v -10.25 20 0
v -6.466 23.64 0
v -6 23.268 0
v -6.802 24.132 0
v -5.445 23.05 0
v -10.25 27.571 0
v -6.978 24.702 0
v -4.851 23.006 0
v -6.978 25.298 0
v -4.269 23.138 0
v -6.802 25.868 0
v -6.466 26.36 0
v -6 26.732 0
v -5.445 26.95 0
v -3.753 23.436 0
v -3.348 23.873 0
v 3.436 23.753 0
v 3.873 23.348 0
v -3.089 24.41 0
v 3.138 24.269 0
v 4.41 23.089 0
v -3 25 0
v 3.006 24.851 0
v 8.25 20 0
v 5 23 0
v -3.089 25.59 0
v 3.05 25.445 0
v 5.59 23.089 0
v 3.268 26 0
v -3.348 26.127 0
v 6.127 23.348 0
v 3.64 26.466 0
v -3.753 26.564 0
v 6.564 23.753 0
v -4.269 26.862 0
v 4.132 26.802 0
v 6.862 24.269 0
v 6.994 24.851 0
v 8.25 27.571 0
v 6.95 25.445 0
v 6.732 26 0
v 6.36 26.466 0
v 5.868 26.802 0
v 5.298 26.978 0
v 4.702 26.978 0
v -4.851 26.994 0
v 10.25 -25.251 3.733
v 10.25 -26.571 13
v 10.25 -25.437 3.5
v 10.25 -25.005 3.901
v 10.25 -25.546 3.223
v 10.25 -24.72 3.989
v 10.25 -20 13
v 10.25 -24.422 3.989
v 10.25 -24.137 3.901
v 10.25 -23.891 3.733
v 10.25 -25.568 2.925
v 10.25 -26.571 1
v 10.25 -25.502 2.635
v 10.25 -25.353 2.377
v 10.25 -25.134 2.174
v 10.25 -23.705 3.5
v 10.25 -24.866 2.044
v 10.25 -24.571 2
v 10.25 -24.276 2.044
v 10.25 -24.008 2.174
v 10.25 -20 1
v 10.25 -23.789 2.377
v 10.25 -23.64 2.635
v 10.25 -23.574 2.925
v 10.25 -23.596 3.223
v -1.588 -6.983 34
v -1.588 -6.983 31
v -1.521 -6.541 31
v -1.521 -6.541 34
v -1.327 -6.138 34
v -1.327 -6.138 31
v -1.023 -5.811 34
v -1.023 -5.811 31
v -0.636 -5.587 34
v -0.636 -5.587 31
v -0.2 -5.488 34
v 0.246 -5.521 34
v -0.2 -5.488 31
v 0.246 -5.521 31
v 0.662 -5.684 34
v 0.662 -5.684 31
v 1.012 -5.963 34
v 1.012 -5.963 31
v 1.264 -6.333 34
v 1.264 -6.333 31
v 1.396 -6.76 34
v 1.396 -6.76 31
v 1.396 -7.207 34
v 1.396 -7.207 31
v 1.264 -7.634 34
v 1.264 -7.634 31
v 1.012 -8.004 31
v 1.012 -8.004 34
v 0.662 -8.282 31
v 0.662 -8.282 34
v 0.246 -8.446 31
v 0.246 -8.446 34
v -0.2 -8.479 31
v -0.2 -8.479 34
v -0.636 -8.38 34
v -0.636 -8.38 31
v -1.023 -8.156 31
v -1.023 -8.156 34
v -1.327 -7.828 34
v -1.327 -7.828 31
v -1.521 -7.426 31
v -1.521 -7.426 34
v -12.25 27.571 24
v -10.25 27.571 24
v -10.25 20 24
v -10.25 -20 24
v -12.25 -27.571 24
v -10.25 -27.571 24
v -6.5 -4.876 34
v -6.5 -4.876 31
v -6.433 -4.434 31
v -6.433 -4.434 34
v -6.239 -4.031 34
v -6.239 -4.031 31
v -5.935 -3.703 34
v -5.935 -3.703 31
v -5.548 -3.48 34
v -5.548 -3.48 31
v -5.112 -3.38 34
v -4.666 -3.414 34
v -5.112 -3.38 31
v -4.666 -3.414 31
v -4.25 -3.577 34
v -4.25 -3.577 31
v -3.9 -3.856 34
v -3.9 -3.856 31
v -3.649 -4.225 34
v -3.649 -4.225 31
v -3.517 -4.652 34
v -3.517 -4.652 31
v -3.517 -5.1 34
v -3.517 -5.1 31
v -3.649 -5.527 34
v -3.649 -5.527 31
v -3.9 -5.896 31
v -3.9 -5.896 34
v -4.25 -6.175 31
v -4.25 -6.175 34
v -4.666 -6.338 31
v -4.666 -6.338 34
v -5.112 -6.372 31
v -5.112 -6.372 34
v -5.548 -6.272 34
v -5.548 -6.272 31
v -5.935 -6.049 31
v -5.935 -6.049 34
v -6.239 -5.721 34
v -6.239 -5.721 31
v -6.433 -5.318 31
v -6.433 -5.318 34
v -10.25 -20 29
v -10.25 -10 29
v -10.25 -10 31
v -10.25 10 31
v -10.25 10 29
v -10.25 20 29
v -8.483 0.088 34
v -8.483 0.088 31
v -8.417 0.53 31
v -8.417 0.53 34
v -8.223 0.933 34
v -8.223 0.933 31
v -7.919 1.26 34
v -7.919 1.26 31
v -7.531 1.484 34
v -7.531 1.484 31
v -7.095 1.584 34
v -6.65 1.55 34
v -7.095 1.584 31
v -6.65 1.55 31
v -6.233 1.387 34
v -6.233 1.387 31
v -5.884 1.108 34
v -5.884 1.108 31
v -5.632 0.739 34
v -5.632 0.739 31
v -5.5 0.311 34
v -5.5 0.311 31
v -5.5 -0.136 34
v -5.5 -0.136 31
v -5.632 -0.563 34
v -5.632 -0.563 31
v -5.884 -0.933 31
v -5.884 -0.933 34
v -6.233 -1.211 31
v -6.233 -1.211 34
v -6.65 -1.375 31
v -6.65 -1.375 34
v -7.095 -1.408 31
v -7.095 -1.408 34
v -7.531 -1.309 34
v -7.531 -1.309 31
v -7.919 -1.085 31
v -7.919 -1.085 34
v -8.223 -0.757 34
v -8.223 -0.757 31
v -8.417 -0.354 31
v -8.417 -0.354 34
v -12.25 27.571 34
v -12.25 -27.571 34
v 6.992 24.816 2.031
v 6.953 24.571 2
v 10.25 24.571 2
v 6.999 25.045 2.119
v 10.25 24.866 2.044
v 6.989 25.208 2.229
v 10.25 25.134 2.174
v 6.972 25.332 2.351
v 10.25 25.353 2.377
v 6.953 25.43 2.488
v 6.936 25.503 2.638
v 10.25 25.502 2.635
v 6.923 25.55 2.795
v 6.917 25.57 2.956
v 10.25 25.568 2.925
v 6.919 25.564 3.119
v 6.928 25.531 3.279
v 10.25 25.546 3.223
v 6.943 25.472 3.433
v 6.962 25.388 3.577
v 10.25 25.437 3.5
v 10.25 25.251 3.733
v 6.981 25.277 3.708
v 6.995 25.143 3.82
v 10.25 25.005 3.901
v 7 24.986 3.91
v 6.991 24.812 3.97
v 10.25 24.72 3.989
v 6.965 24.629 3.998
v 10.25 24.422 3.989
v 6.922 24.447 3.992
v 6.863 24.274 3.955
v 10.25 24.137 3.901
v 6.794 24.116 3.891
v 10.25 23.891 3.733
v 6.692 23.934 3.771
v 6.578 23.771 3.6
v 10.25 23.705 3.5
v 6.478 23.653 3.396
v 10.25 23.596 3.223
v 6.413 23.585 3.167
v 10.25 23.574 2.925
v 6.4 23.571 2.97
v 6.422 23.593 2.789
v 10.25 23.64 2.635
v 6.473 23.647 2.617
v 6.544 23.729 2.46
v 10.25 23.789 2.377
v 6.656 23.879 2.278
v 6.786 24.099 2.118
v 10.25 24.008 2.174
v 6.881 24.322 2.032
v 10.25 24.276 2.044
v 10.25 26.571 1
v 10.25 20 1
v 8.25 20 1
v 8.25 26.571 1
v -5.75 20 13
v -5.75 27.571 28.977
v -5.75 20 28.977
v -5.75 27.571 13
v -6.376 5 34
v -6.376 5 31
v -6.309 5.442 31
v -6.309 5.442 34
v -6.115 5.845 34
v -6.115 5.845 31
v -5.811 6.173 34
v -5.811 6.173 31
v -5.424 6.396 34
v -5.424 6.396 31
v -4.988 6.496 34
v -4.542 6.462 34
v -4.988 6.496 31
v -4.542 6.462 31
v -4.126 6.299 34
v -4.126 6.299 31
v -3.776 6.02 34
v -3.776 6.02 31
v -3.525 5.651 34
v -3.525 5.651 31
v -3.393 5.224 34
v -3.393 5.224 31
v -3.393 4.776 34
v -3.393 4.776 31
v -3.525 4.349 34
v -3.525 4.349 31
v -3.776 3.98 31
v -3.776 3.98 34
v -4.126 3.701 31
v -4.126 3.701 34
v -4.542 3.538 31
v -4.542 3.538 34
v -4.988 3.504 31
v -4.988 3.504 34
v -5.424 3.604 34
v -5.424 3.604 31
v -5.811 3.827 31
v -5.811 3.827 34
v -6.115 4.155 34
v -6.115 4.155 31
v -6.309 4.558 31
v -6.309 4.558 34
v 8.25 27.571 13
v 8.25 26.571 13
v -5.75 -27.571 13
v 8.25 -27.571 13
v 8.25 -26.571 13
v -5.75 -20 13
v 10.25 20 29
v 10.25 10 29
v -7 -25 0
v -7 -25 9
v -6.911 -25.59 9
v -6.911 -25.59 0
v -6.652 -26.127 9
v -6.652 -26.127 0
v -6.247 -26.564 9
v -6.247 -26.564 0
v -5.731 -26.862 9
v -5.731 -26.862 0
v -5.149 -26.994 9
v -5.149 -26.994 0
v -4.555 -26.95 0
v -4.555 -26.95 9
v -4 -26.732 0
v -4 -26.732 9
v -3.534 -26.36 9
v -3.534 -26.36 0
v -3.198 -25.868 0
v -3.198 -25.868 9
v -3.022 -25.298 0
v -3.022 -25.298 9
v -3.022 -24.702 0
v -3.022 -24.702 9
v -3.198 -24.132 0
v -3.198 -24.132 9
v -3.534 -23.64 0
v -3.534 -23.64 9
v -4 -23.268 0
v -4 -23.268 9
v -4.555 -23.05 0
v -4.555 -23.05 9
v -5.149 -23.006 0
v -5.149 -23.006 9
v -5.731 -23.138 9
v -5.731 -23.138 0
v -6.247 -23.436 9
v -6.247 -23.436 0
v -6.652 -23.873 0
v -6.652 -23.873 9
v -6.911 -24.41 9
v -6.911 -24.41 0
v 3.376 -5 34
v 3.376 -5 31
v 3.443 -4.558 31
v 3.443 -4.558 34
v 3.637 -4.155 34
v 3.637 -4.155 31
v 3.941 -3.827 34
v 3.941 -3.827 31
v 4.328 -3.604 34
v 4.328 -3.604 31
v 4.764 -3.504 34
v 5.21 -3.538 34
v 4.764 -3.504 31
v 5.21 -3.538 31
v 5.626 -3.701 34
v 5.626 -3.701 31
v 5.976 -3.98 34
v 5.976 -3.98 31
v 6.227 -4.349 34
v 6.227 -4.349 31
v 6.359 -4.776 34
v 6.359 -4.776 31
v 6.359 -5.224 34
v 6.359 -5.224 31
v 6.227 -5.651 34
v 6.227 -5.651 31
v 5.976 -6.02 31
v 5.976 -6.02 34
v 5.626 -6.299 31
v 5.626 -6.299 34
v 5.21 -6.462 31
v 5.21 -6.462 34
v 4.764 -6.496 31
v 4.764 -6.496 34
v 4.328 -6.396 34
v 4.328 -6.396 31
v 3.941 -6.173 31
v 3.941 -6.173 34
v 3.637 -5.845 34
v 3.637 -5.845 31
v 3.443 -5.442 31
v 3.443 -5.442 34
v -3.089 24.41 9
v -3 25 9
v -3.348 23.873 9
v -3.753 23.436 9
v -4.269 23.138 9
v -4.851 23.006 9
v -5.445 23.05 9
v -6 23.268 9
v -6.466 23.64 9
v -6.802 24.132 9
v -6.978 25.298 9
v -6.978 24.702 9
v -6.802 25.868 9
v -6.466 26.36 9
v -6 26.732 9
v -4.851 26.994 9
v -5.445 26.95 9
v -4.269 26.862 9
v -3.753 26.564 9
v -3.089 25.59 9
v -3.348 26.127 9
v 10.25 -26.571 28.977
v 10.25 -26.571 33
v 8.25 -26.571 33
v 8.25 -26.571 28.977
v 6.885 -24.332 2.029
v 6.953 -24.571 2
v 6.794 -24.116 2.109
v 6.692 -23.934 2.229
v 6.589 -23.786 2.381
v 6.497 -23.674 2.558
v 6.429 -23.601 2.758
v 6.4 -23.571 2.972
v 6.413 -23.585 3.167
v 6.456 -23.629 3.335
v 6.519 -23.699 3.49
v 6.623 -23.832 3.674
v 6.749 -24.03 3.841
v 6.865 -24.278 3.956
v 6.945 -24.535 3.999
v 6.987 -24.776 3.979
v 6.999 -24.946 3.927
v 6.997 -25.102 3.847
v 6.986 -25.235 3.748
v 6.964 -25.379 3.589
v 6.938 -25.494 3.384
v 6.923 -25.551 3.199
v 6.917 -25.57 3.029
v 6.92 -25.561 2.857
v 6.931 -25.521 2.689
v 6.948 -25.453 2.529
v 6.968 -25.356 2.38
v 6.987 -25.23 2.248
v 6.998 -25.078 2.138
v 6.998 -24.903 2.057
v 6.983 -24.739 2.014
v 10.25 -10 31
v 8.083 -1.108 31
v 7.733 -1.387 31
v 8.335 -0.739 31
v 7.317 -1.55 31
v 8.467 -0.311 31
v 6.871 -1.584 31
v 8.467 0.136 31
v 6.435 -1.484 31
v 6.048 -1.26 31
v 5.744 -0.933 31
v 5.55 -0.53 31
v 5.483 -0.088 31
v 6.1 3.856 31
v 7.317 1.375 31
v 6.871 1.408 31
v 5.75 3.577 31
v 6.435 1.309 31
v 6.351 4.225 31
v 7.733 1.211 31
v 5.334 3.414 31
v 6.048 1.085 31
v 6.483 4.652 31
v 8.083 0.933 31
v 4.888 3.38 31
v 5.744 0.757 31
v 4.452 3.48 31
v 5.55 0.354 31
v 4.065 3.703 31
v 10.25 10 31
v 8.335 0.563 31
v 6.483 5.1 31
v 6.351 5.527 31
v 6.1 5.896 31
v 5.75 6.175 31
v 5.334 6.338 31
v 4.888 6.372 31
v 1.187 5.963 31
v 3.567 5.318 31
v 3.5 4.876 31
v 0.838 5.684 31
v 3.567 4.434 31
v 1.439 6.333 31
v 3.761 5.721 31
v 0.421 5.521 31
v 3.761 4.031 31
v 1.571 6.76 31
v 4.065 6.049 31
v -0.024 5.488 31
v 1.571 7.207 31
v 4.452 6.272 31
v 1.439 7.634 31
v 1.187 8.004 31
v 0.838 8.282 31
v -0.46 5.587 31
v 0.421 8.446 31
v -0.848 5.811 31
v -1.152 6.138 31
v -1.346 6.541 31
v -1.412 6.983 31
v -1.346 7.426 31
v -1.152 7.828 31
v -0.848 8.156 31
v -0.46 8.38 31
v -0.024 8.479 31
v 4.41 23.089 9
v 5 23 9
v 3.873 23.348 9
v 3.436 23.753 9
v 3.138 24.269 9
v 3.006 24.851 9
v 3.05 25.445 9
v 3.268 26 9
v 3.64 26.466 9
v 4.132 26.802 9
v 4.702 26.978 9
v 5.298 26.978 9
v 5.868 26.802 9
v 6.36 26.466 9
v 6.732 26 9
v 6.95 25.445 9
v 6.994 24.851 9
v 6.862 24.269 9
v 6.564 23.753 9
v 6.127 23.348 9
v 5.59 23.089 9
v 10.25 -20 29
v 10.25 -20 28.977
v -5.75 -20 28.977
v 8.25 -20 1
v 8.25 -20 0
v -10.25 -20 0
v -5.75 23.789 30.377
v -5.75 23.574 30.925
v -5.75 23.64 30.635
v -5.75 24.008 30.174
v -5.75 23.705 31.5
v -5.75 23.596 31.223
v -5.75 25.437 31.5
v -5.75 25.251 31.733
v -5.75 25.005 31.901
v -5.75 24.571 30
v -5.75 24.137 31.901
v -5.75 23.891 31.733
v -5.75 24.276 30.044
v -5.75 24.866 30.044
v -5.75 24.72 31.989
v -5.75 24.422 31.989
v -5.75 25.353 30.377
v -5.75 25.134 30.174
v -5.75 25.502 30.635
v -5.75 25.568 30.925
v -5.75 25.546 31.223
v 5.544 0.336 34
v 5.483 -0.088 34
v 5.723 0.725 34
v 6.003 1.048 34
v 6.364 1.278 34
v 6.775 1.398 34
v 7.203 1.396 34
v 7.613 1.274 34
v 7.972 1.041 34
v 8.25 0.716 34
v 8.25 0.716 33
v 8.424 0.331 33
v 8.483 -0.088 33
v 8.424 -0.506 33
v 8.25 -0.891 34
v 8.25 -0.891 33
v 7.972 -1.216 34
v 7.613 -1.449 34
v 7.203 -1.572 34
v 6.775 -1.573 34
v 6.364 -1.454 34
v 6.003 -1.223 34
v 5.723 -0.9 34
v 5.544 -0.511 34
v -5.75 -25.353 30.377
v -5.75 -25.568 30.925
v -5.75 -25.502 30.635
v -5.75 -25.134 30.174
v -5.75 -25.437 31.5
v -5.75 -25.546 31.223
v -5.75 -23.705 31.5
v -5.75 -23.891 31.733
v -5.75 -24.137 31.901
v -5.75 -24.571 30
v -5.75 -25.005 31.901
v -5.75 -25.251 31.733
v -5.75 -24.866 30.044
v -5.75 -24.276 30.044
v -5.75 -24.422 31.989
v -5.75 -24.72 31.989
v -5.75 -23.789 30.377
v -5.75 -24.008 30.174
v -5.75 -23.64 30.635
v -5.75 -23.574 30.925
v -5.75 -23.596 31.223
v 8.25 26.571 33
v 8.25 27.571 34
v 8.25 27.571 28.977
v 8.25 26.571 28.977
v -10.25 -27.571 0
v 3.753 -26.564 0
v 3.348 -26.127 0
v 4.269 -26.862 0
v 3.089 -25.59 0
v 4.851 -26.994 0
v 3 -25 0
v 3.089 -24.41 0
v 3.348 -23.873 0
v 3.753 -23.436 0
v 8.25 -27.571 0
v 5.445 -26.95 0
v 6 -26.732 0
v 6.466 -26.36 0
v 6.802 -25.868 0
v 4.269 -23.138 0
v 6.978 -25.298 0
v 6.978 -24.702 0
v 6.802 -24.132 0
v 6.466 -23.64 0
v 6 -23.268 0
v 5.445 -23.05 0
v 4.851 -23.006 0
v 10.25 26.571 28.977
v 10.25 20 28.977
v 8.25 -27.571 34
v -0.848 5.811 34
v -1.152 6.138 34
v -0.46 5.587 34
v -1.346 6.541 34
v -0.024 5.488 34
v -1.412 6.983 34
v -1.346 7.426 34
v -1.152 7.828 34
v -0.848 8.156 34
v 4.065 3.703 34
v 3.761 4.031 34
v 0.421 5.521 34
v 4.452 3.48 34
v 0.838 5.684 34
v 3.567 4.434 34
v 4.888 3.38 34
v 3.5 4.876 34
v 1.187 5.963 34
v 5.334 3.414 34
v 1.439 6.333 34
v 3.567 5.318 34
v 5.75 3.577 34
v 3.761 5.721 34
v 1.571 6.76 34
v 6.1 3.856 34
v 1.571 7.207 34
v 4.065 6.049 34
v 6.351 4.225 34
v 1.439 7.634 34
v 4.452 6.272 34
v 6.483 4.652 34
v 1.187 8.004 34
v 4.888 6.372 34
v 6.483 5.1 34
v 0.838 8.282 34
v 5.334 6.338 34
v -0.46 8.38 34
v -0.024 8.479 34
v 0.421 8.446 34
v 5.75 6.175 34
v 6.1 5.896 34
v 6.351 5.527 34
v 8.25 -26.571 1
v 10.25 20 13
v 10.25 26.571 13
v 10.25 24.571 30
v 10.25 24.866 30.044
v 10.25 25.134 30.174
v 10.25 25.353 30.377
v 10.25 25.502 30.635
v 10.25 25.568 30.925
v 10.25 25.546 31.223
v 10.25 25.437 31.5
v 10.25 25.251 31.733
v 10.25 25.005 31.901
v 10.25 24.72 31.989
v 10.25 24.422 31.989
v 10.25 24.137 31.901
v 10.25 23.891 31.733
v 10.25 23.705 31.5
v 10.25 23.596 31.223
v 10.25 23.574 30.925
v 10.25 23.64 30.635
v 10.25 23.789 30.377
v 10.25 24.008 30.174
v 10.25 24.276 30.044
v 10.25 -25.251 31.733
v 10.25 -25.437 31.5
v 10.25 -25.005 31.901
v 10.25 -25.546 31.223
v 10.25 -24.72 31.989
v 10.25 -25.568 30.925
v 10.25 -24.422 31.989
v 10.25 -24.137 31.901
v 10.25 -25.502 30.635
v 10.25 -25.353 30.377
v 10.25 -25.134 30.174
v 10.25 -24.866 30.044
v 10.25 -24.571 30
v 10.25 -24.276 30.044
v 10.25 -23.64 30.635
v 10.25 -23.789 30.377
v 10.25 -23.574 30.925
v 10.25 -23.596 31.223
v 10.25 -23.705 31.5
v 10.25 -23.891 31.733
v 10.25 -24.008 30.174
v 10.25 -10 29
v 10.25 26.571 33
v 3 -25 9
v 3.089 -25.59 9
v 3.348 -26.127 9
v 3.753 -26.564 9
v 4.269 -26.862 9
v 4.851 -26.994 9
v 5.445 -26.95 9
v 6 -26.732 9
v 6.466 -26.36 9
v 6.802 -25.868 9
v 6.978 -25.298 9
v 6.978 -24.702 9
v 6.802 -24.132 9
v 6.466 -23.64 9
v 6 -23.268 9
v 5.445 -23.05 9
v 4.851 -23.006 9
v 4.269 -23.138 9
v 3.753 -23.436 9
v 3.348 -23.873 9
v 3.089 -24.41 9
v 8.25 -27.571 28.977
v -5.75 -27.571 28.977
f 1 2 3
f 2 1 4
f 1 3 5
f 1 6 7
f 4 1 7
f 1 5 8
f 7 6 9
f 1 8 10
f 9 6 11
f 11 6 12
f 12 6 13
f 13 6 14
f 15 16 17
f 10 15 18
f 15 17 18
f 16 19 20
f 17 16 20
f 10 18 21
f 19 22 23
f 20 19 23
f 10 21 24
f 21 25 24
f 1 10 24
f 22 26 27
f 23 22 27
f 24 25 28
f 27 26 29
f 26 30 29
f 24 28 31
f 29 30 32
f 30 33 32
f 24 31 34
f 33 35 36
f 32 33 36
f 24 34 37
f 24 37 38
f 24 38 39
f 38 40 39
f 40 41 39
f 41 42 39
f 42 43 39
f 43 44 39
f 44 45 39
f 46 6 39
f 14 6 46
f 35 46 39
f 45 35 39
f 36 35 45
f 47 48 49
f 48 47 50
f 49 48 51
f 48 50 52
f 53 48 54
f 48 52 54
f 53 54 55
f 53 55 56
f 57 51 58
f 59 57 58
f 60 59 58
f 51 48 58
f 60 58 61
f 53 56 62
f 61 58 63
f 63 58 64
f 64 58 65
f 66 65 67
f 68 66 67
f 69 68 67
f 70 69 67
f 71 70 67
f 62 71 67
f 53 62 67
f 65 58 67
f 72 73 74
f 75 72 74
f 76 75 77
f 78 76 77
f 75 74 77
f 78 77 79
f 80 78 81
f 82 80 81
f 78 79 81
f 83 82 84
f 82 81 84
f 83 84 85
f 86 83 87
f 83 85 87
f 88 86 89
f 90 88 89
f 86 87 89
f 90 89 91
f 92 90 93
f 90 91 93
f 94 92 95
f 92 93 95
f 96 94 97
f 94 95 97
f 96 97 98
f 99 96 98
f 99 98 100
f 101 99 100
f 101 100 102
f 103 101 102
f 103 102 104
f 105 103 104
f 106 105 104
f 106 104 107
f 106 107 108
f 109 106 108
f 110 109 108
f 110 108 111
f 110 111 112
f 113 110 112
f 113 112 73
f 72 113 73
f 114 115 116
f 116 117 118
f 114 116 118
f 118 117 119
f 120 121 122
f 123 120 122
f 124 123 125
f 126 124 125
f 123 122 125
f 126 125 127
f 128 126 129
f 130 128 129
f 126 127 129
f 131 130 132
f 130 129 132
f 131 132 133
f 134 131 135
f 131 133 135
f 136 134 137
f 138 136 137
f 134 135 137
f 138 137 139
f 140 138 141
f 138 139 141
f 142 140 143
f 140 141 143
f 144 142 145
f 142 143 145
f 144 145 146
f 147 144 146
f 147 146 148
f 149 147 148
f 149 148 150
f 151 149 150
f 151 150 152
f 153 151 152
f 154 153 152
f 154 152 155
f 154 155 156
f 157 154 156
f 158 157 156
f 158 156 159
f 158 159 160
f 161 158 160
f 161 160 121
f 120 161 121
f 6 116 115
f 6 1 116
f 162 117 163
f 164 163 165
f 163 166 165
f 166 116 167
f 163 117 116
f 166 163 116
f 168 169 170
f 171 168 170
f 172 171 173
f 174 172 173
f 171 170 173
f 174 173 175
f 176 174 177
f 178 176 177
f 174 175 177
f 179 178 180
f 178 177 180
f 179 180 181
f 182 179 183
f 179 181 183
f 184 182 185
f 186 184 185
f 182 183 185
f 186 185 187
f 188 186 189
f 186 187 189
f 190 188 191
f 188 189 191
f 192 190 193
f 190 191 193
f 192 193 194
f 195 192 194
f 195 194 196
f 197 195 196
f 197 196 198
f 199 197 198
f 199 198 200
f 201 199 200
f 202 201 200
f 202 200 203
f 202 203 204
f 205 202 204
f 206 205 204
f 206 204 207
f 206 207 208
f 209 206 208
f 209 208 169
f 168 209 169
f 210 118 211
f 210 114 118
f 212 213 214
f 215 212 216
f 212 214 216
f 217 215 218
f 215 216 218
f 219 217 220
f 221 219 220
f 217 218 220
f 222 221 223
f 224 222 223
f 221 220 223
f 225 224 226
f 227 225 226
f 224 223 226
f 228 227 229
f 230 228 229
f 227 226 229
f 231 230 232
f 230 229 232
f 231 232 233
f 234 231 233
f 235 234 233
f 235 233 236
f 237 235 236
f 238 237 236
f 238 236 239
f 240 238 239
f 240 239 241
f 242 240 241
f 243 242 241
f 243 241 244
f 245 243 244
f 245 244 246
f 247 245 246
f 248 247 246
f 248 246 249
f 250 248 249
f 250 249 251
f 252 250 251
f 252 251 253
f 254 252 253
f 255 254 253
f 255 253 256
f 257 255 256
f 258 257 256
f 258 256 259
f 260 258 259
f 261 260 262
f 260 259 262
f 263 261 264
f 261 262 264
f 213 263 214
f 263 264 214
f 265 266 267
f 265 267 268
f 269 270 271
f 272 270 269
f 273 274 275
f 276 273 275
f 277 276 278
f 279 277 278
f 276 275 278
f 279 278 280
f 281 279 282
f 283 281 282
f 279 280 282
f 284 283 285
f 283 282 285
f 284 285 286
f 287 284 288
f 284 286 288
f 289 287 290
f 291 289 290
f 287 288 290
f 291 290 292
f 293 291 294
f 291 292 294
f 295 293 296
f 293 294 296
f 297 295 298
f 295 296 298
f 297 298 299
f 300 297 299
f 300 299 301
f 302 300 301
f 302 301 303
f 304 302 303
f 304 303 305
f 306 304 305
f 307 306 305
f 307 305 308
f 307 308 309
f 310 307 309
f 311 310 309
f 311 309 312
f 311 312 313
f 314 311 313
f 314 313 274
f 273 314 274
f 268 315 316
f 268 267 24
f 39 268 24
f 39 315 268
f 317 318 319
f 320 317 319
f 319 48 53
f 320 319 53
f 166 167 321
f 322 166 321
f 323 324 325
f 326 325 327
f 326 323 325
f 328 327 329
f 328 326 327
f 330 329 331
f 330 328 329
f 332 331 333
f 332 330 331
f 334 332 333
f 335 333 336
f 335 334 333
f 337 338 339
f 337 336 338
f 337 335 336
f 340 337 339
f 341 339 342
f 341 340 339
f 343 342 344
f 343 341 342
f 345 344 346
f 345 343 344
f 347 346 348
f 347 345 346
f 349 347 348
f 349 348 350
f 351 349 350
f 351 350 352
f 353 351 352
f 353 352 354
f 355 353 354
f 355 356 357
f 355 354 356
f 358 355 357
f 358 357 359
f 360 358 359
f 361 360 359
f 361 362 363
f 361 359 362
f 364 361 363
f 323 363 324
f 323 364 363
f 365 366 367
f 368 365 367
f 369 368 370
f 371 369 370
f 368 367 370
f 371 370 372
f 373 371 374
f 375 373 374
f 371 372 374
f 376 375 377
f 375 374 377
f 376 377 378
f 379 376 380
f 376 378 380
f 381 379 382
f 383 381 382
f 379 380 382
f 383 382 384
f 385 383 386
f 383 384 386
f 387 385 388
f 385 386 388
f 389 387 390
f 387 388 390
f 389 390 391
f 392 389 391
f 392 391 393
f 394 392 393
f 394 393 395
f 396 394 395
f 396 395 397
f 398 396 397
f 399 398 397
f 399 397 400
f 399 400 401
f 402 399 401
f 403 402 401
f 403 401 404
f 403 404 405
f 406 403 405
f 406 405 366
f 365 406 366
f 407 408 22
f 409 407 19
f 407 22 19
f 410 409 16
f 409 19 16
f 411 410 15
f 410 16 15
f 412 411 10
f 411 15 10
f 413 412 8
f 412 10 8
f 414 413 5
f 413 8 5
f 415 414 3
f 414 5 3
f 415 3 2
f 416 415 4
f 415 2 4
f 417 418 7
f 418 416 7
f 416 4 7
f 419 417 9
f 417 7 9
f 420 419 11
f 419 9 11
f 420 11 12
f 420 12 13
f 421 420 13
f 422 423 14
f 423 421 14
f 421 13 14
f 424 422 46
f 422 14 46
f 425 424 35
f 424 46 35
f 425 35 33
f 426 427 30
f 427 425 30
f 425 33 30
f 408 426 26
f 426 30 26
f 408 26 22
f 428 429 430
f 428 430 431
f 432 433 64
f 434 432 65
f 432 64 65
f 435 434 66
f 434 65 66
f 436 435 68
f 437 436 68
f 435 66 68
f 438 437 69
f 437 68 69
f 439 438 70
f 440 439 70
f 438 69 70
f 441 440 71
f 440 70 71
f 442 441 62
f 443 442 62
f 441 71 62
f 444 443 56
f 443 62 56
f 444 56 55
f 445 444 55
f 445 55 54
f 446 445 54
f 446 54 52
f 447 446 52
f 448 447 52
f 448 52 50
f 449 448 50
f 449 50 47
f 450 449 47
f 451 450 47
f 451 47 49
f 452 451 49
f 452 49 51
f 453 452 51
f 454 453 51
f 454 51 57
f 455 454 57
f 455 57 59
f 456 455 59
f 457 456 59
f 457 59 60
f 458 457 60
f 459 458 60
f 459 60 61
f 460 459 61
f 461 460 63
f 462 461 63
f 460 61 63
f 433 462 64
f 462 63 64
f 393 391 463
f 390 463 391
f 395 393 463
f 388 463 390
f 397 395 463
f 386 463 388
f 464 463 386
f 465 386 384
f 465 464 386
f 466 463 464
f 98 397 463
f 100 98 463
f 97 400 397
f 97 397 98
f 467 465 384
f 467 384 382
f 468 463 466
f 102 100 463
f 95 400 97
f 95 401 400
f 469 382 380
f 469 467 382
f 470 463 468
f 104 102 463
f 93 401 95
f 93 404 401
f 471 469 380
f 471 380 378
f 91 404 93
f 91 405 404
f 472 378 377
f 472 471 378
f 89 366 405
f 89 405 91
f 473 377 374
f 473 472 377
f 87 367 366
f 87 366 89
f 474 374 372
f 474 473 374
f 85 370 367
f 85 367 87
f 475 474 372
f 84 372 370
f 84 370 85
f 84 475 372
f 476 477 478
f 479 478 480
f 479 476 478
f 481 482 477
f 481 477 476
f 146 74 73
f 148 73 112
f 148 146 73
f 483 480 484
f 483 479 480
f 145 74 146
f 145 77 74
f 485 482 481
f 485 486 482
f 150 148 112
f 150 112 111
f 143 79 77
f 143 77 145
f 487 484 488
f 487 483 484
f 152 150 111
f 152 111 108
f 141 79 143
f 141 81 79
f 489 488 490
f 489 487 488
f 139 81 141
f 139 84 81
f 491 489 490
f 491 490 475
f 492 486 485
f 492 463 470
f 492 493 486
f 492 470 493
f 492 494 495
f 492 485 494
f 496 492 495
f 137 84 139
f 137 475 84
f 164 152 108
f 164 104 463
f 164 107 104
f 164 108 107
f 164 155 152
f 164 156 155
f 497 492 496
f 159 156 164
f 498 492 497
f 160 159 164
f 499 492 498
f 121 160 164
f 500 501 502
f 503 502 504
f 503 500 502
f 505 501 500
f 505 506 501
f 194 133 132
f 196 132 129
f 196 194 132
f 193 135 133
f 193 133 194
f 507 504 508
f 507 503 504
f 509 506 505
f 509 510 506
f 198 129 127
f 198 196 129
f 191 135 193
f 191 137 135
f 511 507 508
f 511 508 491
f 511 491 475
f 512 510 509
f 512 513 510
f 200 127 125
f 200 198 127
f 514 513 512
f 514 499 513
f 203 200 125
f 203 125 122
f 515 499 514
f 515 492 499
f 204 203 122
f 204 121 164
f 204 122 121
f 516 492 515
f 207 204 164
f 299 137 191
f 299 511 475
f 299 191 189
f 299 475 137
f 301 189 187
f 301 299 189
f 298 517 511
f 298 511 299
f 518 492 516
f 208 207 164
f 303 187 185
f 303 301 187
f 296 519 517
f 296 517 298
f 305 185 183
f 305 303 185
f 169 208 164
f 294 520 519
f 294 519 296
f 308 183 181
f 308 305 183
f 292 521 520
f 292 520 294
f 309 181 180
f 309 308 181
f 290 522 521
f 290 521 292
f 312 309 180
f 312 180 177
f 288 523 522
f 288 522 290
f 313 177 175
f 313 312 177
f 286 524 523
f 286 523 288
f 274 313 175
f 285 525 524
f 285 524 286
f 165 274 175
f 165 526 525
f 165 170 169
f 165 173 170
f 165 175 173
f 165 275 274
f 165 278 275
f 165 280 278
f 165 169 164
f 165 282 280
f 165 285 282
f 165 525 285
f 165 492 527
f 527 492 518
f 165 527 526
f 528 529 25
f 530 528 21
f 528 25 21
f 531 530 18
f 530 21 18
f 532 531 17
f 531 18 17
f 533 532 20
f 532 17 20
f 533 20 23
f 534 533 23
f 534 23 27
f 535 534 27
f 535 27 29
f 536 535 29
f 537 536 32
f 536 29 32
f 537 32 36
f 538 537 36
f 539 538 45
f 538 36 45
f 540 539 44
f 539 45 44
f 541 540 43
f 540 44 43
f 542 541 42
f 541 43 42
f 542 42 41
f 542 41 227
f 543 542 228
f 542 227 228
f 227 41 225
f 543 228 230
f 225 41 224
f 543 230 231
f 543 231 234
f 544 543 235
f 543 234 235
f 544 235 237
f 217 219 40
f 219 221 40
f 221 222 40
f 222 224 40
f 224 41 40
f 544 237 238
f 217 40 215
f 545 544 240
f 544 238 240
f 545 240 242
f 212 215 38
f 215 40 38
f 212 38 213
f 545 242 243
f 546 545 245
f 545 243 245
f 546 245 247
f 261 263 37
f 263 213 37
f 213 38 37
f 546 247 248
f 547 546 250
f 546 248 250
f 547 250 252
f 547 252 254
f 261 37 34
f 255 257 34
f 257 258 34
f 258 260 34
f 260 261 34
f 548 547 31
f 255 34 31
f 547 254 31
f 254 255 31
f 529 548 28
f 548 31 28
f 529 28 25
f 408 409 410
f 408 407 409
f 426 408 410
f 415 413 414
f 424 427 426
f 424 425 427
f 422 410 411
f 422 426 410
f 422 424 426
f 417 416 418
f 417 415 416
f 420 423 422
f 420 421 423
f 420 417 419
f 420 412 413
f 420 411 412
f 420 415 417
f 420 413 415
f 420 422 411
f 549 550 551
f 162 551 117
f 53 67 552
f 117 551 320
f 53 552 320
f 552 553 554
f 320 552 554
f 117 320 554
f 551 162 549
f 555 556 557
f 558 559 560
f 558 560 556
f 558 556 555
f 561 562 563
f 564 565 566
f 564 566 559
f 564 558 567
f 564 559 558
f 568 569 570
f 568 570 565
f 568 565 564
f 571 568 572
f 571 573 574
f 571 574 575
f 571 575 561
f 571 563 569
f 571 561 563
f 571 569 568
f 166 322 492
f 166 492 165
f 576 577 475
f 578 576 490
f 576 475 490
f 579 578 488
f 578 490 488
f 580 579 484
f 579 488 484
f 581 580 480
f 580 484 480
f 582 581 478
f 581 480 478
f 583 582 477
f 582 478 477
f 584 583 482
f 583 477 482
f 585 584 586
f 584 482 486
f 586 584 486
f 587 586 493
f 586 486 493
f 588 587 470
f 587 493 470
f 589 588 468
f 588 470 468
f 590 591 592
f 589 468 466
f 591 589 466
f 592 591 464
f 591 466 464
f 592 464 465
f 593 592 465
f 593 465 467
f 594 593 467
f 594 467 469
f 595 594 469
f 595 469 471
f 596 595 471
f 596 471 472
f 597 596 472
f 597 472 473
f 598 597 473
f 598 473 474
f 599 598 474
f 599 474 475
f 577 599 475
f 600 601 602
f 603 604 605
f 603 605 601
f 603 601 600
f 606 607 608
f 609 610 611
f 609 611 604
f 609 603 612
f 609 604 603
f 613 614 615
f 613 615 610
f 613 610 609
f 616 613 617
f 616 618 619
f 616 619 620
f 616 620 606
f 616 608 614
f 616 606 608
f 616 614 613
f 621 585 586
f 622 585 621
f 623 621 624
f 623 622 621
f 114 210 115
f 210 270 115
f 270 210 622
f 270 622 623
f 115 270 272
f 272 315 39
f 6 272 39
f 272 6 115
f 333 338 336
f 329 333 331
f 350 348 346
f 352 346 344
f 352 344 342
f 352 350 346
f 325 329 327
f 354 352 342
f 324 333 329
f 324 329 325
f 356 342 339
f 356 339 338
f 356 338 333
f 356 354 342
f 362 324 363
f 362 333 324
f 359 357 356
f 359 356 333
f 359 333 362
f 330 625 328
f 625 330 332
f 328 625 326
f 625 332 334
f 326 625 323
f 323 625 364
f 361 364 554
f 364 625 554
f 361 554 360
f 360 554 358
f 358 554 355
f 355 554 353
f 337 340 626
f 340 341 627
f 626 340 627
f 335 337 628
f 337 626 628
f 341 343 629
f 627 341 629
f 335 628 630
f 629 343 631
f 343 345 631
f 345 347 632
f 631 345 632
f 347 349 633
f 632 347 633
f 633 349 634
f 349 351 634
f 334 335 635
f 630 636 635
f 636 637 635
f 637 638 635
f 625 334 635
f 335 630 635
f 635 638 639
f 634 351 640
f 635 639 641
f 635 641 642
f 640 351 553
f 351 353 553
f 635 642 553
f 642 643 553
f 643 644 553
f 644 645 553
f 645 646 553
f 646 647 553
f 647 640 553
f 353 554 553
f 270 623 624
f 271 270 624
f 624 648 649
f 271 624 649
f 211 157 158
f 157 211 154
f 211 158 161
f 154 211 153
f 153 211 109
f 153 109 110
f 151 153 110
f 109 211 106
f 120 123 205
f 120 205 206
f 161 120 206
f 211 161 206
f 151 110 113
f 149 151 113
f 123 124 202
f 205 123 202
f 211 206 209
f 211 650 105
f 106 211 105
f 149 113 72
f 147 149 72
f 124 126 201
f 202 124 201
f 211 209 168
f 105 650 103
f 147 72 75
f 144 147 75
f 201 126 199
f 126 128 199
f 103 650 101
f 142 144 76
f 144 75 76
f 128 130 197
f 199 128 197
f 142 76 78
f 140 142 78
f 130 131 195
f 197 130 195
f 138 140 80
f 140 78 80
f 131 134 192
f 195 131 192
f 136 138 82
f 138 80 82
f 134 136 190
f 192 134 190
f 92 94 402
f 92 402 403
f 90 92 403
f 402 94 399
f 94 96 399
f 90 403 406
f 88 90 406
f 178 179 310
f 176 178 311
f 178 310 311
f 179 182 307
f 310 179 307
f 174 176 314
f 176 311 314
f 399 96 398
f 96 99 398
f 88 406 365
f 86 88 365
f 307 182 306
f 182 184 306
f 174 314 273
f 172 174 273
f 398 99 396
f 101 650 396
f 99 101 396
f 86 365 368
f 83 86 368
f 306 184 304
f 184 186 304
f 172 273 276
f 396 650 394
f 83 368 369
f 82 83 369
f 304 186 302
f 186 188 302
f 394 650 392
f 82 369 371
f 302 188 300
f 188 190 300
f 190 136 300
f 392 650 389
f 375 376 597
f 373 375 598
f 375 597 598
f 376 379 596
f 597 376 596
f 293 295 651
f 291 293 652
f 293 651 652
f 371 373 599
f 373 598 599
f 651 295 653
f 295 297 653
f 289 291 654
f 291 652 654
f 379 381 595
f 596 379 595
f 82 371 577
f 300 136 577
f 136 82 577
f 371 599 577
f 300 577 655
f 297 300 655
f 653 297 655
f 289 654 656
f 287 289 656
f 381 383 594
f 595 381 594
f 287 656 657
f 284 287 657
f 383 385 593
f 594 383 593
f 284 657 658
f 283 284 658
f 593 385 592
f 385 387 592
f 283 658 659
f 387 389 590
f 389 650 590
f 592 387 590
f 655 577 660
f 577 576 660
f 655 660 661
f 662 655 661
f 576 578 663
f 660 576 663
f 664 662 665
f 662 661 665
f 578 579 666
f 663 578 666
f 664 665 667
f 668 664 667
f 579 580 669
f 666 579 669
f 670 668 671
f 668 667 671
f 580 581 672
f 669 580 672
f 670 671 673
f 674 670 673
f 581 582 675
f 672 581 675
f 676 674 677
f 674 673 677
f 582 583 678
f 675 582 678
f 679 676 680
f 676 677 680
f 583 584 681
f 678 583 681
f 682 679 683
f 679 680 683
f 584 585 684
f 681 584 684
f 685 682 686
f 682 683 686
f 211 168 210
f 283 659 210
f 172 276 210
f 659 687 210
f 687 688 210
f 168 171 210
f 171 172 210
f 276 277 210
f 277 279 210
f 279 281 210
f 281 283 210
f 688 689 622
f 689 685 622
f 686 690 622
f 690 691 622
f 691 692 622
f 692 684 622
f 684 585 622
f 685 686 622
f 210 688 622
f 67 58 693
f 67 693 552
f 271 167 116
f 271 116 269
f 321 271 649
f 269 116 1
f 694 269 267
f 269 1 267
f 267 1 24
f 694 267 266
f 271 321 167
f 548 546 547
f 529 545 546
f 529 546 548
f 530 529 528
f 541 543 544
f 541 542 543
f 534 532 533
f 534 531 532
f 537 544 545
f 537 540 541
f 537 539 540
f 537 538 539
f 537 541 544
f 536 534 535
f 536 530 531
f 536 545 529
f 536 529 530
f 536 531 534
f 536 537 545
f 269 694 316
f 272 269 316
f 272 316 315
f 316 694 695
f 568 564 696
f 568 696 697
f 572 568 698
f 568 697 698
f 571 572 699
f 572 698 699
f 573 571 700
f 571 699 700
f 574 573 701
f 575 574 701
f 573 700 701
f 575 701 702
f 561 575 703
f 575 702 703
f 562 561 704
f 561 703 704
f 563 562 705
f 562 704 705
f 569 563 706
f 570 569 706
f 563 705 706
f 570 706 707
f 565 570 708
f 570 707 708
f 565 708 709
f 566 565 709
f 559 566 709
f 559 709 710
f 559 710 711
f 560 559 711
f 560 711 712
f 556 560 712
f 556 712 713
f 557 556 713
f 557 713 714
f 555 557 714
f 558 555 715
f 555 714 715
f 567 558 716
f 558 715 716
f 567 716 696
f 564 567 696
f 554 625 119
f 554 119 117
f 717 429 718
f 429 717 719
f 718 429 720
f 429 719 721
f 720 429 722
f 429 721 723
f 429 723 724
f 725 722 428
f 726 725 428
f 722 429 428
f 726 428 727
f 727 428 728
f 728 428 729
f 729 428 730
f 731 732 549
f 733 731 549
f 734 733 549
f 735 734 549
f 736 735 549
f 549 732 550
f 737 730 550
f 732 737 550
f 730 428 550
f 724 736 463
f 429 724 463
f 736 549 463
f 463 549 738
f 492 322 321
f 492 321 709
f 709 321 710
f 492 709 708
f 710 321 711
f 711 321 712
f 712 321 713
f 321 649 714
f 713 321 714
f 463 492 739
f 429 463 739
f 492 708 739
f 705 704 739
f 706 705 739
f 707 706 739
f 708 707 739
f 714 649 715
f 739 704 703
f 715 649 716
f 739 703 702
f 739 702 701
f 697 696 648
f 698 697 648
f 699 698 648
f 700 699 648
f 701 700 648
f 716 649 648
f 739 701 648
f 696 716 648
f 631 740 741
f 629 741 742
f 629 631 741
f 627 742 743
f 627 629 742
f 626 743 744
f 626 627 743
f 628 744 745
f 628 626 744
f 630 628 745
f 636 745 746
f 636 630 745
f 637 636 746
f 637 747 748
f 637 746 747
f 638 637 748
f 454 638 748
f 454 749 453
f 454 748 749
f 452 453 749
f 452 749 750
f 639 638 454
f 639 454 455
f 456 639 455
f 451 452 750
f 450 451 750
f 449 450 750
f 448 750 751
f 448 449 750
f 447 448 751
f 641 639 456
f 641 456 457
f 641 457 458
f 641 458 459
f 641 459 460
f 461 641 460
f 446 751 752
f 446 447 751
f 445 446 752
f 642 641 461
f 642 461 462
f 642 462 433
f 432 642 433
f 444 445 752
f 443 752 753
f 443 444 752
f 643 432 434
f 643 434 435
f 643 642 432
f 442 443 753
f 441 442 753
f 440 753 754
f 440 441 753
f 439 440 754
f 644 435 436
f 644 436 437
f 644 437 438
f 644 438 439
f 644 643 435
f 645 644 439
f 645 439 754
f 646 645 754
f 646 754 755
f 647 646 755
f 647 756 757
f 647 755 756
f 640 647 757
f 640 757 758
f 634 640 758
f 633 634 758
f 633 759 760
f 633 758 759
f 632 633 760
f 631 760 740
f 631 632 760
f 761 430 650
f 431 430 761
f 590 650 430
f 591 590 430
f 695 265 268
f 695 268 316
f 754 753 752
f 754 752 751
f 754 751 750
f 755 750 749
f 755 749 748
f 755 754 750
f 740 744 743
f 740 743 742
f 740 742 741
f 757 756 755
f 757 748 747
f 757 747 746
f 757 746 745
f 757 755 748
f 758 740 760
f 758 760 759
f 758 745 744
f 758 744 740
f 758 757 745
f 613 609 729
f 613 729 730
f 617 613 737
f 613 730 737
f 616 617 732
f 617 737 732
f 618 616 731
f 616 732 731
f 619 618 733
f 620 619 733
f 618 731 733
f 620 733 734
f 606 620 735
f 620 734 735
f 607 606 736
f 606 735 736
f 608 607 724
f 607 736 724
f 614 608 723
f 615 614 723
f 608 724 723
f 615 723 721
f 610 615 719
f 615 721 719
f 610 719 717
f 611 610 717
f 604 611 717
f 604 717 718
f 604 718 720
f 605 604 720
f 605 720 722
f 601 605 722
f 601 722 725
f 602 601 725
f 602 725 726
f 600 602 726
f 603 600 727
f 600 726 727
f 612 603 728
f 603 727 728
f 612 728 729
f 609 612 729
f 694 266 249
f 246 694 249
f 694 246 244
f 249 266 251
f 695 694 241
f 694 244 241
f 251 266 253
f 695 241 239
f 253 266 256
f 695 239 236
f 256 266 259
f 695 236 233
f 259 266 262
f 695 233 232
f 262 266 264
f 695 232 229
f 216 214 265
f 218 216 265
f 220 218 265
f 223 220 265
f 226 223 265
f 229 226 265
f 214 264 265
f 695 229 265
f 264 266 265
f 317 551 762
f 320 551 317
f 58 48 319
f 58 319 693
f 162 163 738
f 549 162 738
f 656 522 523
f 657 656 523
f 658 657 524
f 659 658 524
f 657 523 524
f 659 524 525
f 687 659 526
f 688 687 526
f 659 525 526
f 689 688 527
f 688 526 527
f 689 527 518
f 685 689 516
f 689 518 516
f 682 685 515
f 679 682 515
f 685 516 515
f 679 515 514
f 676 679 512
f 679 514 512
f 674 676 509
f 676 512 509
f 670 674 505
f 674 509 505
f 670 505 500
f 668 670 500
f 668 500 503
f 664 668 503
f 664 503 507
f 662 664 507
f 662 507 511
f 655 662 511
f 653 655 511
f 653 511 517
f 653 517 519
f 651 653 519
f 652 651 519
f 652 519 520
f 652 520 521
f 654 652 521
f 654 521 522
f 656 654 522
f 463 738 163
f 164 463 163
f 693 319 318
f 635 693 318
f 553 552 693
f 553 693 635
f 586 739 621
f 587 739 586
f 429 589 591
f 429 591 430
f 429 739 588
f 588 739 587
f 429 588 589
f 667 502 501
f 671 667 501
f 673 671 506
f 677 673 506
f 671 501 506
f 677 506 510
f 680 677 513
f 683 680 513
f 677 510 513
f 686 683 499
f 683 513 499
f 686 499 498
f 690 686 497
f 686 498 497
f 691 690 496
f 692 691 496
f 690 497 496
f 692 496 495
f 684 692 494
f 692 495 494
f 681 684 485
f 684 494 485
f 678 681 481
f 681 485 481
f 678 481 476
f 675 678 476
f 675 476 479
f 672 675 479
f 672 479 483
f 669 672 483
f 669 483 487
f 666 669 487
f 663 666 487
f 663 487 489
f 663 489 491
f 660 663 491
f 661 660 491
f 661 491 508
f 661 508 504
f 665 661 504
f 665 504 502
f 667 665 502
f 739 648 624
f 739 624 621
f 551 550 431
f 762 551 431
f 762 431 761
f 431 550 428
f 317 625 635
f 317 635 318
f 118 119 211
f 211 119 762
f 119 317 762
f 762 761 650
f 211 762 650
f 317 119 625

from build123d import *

# Parameters (mm, degrees)
SKETCH_1_R           = 2.000000000000001
EXTRUDE_1_DEPTH      = 29
SKETCH_2_W           = 20.5
SKETCH_2_H           = 70.28340969233892
EXTRUDE_2_DEPTH      = 3
SKETCH_3_W           = 20.5
SKETCH_3_H           = 7.570852423084727
CUT_EXTRUDE_1_DEPTH  = 49.62100286394029
SKETCH_5_R           = 2.5
EXTRUDE_3_DEPTH      = 10
CUT_EXTRUDE_2_REACH  = 75.297
SKETCH_8_R           = 1.6000000000000003
SKETCH_9_W           = 20.5
SKETCH_9_H           = 32
CUT_EXTRUDE_3_DEPTH  = 65.57298284377197
SKETCH_12_W          = 20.499999999999996
SKETCH_12_H          = 7.57085242308473
SKETCH_12_R          = 2.0000000000000018
SKETCH_12_R_2        = 2.000000000000001
EXTRUDE_5_DEPTH      = 30
EXTRUDE_6_DEPTH      = 10
SKETCH_16_R          = 1.5000000000000004
CUT_EXTRUDE_5_DEPTH  = 48.388093987806805
SKETCH_17_R          = 1.5000000000000004
CUT_EXTRUDE_6_DEPTH  = 51.404676958704755
EXTRUDE_START        = 10
SKETCH_19_R          = 4
SKETCH_19_R_2        = 2.5000000000000004
EXTRUDE_7_DEPTH      = 10
SKETCH_21_R          = 1.5000000000000004
CUT_EXTRUDE_7_DEPTH  = 48.38809406709012
SKETCH_22_R          = 1.5000000000000004
CUT_EXTRUDE_8_DEPTH  = 51.404676958704755
SKETCH_23_W          = 20.5
SKETCH_23_H          = 55.141704846169446
EXTRUDE_8_DEPTH      = 2
EXTRUDE_9_DEPTH      = 2
CUT_EXTRUDE_9_DEPTH  = 16
EXTRUDE_START_2      = 20
SKETCH_26_R          = 2.000000000000003
SKETCH_26_R_2        = 2.000000000000001
SKETCH_26_R_3        = 2.000000000000002
EXTRUDE_10_DEPTH     = 20
SKETCH_27_W          = 16
SKETCH_27_H          = 8.000000000000007
CUT_EXTRUDE_10_DEPTH = 75.49499461906014
SKETCH_29_W          = 34
SKETCH_29_H          = 55.14170484616947
CUT_EXTRUDE_11_DEPTH = 2
SKETCH_32_W          = 3.9768627953179667
SKETCH_32_H          = 6.57085242308473
CUT_EXTRUDE_13_DEPTH = 16
SKETCH_33_R          = 1.0000000000000018
CUT_EXTRUDE_14_DEPTH = 16
SKETCH_35_R          = 1.0000000000000004
CUT_EXTRUDE_15_DEPTH = 5
SKETCH_36_R          = 2.65
CUT_EXTRUDE_16_DEPTH = 10
CUT_EXTRUDE_START    = -10
SKETCH_37_R          = 2.65
CUT_EXTRUDE_17_DEPTH = 10
SKETCH_38_W          = 22.5
SKETCH_38_H          = 55.14170484616945
CUT_EXTRUDE_18_DEPTH = 50.01664477615112
SKETCH_39_R          = 1.5000000000000002
SKETCH_39_R_2        = 1.5
SKETCH_39_R_3        = 1.5000000000000004
SKETCH_39_R_4        = 1.4999999999999998
SKETCH_39_R_5        = 1.5000000000000007
SKETCH_39_R_6        = 1.4999999999999996
CUT_EXTRUDE_22_DEPTH = 5
SKETCH_41_W          = 20.499999999999993
SKETCH_41_H          = 20
CUT_EXTRUDE_23_DEPTH = 2


with BuildPart() as part:
    # 草图1 → 凸台-拉伸1 (new body)
    # profile 1 of 3: a face of its own
    with BuildSketch(Plane.XY):
        with BuildLine():
            Line((-10.250000000000004, 35.14170484616946), (-10.250000000000004, 20))
            Line((-10.25, 20.000000000000004), (-4.999999999999999, 20.000000000000004))
            Line((-4.999999999999999, 20.000000000000004), (-4.999999999999999, 23.000000000000004))
            ThreePointArc((-5.000000000000001, 23.000000000000004), (-6.414213562373094, 26.4142135623731), (-2.9999999999999982, 25.000000000000004))
            Line((-2.9999999999999982, 25.000000000000004), (3, 25.000000000000004))
            ThreePointArc((3, 25.000000000000004), (5.000000000000001, 27.000000000000004), (7.000000000000002, 25.000000000000004))
            ThreePointArc((7.000000000000002, 25.000000000000004), (6.414213562373095, 23.585786437626908), (4.999999999999999, 23.000000000000004))
            Line((5.000000000000001, 23.000000000000004), (5.000000000000001, 20.000000000000004))
            Line((5, 20.000000000000004), (10.249999999999996, 20.000000000000004))
            Line((10.249999999999996, 20), (10.249999999999996, 35.14170484616946))
            Line((10.249999999999996, 35.14170484616946), (-10.250000000000004, 35.14170484616946))
        make_face()
    # profile 2 of 3: a face of its own
    with BuildSketch(Plane.XY):
        Polygon((10.249999999999996, -20), (-10.25, -20), (-10.250000000000004, -35.14170484616946), (10.249999999999996, -35.14170484616946), align=None)
        with Locations(Location((-4.999999999999999, -25.000000000000004, 0), (0, 0, 180))):
            Circle(SKETCH_1_R, mode=Mode.SUBTRACT)
        with Locations(Location((5.000000000000001, -25.000000000000004, 0), (0, 0, 180))):
            Circle(SKETCH_1_R, mode=Mode.SUBTRACT)
    # profile 3 of 3: a face of its own
    with BuildSketch(Plane.XY):
        with BuildLine():
            Line((-4.999999999999999, 23.000000000000004), (-4.999999999999999, 20.000000000000004))
            Line((-4.999999999999999, 20.000000000000004), (5, 20.000000000000004))
            Line((5.000000000000001, 20.000000000000004), (5.000000000000001, 23.000000000000004))
            ThreePointArc((4.999999999999999, 23.000000000000004), (3.585786437626904, 23.585786437626908), (3, 25.000000000000004))
            Line((3, 25.000000000000004), (-2.9999999999999982, 25.000000000000004))
            ThreePointArc((-2.9999999999999982, 25.000000000000004), (-3.585786437626905, 23.585786437626908), (-5.000000000000001, 23.000000000000004))
        make_face()
    extrude(amount=EXTRUDE_1_DEPTH)

    # 草图2 → 凸台-拉伸2 (add)
    with BuildSketch(Plane.XY.offset(29)):
        Rectangle(SKETCH_2_W, SKETCH_2_H)
    extrude(amount=EXTRUDE_2_DEPTH)

    # 草图3 → 切除-拉伸1 (cut, through all)
    with BuildSketch(Plane(origin=(0, 0, 0), x_dir=(-1, 0, 0), z_dir=(0, 0, -1))):
        with Locations((3.55e-15, -31.356278634627095)):
            Rectangle(SKETCH_3_W, SKETCH_3_H)
        Polygon((-10.249999999999996, 35.14170484616946), (-10.249999999999996, 27.57085242308473), (10.250000000000004, 27.570852423084734), (10.250000000000004, 35.14170484616946), align=None)
    extrude(amount=-CUT_EXTRUDE_1_DEPTH, mode=Mode.SUBTRACT)

    # 草图5 → 凸台-拉伸3 (add)
    with BuildSketch(Plane.XZ.offset(27.570852423084734)):
        with Locations(Location((0, 2.5, 0), (0, 0, 270))):
            Circle(SKETCH_5_R)
    extrude(amount=EXTRUDE_3_DEPTH)

    # 草图8 → 切除-拉伸2 (cut, up to next)
    with BuildSketch(Plane(origin=(0, 27.570852423084734, 0), x_dir=(1, 0, 0), z_dir=(0, 1, 0)), mode=Mode.PRIVATE) as cut_extrude_2_sk1:
        with Locations(Location((1.71e-15, -16.5, 0), (0, 0, 270))):
            Circle(SKETCH_8_R)
    cut_extrude_2_tool1 = extrude(cut_extrude_2_sk1.sketch, amount=-CUT_EXTRUDE_2_REACH, mode=Mode.PRIVATE) & part.part
    # 草图8 → 切除-拉伸2 (cut, up to next)
    with BuildSketch(Plane(origin=(0, 27.570852423084734, 0), x_dir=(1, 0, 0), z_dir=(0, 1, 0)), mode=Mode.PRIVATE) as cut_extrude_2_sk2:
        with Locations(Location((1.22e-15, -26.500000000000004, 0), (0, 0, 270))):
            Circle(SKETCH_8_R)
    cut_extrude_2_tool2 = extrude(cut_extrude_2_sk2.sketch, amount=-CUT_EXTRUDE_2_REACH, mode=Mode.PRIVATE) & part.part
    add(cut_extrude_2_tool1.solids().sort_by_distance((0, 27.570852, 16.5))[0], mode=Mode.SUBTRACT)
    add(cut_extrude_2_tool2.solids().sort_by_distance((0, 27.570852, 26.5))[0], mode=Mode.SUBTRACT)

    # 草图9 → 切除-拉伸3 (cut, through all)
    with BuildSketch(Plane.XZ.offset(27.570852423084734)):
        with Locations((-3.55e-15, 16)):
            Rectangle(SKETCH_9_W, SKETCH_9_H)
    extrude(amount=CUT_EXTRUDE_3_DEPTH, mode=Mode.SUBTRACT)

    # 草图12 → 凸台-拉伸5 (add)
    with BuildSketch(Plane(origin=(0, 0, 0), x_dir=(-1, 0, 0), z_dir=(0, 0, -1))):
        with Locations((1.78e-15, 23.78542621154237)):
            Rectangle(SKETCH_12_W, SKETCH_12_H)
        with Locations((-5.000000000000001, 25.000000000000004)):
            Circle(SKETCH_12_R, mode=Mode.SUBTRACT)
        with Locations((4.999999999999999, 25.000000000000004)):
            Circle(SKETCH_12_R_2, mode=Mode.SUBTRACT)
    extrude(amount=-EXTRUDE_5_DEPTH)

    # 草图13 → 凸台-拉伸6 (add)
    with BuildSketch(Plane(origin=(0, 27.570852423084734, 0), x_dir=(1, 0, 0), z_dir=(0, 1, 0))):
        with BuildLine():
            ThreePointArc((4.456e-14, -7.5), (-2.5, -5.000000000000058), (-7.084e-14, -2.4999999999999996))
            Line((-1.4e-16, -2.4999999999999996), (-5e-17, -1))
            ThreePointArc((7.635e-14, -1), (-3.9999999999999996, -4.999999999999907), (-1.067e-13, -9))
            Line((-4.9e-16, -9), (-4.1e-16, -7.5))
        make_face()
        with BuildLine():
            Line((-5e-17, -1), (-1.4e-16, -2.4999999999999996))
            ThreePointArc((-7.084e-14, -2.4999999999999996), (1.7677669529663447, -3.2322330470336054), (2.500000000000001, -5))
            ThreePointArc((2.500000000000001, -5.000000000000001), (1.767766952966385, -6.767766952966354), (4.456e-14, -7.5))
            Line((-4.1e-16, -7.5), (-4.9e-16, -9))
            ThreePointArc((-1.067e-13, -9), (2.828427124746152, -7.828427124746229), (4.000000000000001, -5.000000000000001))
            ThreePointArc((4.000000000000001, -5), (2.8284271247462174, -2.171572875253837), (7.635e-14, -1))
        make_face()
    extrude(amount=EXTRUDE_6_DEPTH)

    # 草图15 → 旋转1 (revolve)
    with BuildSketch(Plane(origin=(0, 0, 0), x_dir=(0, 0, -1), z_dir=(1, 0, 0))):
        with BuildLine():
            Line((-1, 27.570852423084734), (0, 27.570852423084734))
            ThreePointArc((0, 27.570852423084734), (-0.7128919117369903, 27.930797461014013), (-1, 28.676011694509246))
            Line((-1, 28.676011694509246), (-1, 27.570852423084734))
        make_face()
    revolve(axis=Axis((0, -962.4291475769152, 4.99999999999657), (0, 1, 3.43e-15)))

    # 草图16 → 切除-拉伸5 (cut, through all)
    with BuildSketch(Plane.XY.offset(5)):
        with Locations(Location((4.9e-16, 33.57085242308473, 0), (0, 0, 90))):
            Circle(SKETCH_16_R)
    extrude(amount=-CUT_EXTRUDE_5_DEPTH, mode=Mode.SUBTRACT)

    # 草图17 → 切除-拉伸6 (cut, through all)
    with BuildSketch(Plane(origin=(0, 0, 0), x_dir=(0, 0, -1), z_dir=(1, 0, 0))):
        with Locations((-5, 33.57085242308473)):
            Circle(SKETCH_17_R)
    extrude(amount=-CUT_EXTRUDE_6_DEPTH, mode=Mode.SUBTRACT)

    # 草图19 → 凸台-拉伸7 (add)
    with BuildSketch(Plane.XZ.offset(27.570852423084734).offset(EXTRUDE_START)):
        with Locations(Location((0, 4.999999999999998, 0), (0, 0, 270))):
            Circle(SKETCH_19_R)
        with Locations(Location((0, 4.999999999999998, 0), (0, 0, 90))):
            Circle(SKETCH_19_R_2, mode=Mode.SUBTRACT)
    extrude(amount=-EXTRUDE_7_DEPTH)

    # 草图20 → 旋转2 (revolve)
    with BuildSketch(Plane(origin=(0, 0, 0), x_dir=(0, 0, -1), z_dir=(1, 0, 0))):
        with BuildLine():
            Line((-0.9999999999999983, -27.570852423084734), (0, -27.570852423084734))
            ThreePointArc((0, -27.570852423084734), (-0.7071067811865462, -27.863745641898188), (-0.9999999999999981, -28.570852423084734))
            Line((-0.9999999999999981, -28.570852423084734), (-0.9999999999999983, -27.570852423084734))
        make_face()
    revolve(axis=Axis((0, -1027.5708524230847, 4.999999999996567), (0, 1, 3.43e-15)))

    # 草图21 → 切除-拉伸7 (cut, through all)
    with BuildSketch(Plane.XY.offset(5)):
        with Locations((0, -33.57085242308473)):
            Circle(SKETCH_21_R)
    extrude(amount=-CUT_EXTRUDE_7_DEPTH, mode=Mode.SUBTRACT)

    # 草图22 → 切除-拉伸8 (cut, through all)
    with BuildSketch(Plane(origin=(0, 0, 0), x_dir=(0, 0, -1), z_dir=(1, 0, 0))):
        with Locations((-5, -33.57085242308473)):
            Circle(SKETCH_22_R)
    extrude(amount=-CUT_EXTRUDE_8_DEPTH, mode=Mode.SUBTRACT)

    # 草图23 → 凸台-拉伸8 (add)
    with BuildSketch(Plane.XY.offset(32)):
        Rectangle(SKETCH_23_W, SKETCH_23_H)
    extrude(amount=EXTRUDE_8_DEPTH)

    # 草图24 → 凸台-拉伸9 (add)
    with BuildSketch(Plane.ZY.offset(10.250000000000004)):
        Polygon((34, 27.570852423084734), (24, 27.570852423084734), (24.000000000000007, -27.570852423084713), (34, -27.57085242308472), align=None)
    extrude(amount=EXTRUDE_9_DEPTH)

    # 草图25 → 切除-拉伸9 (cut)
    with BuildSketch(Plane(origin=(10.249999999999996, 0, 0), x_dir=(0, 0, -1), z_dir=(1, 0, 0))):
        Polygon((-17, -20), (-25.000000000000004, -20), (-25.000000000000004, -27.570852423084713), (-17, -27.570852423084723), align=None)
        Polygon((-21.000000000000004, 27.570852423084734), (-25.000000000000004, 27.570852423084734), (-25.000000000000004, 20.000000000000004), (-17.000000000000004, 20.000000000000004), (-17.000000000000004, 27.570852423084734), align=None)
    extrude(amount=-CUT_EXTRUDE_9_DEPTH, mode=Mode.SUBTRACT)

    # 草图26 → 凸台-拉伸10 (add)
    with BuildSketch(Plane(origin=(0, 0, 29), x_dir=(-1, 0, 0), z_dir=(0, 0, -1)).offset(EXTRUDE_START_2)):
        with Locations((-5.000000000000001, 25.000000000000004)):
            Circle(SKETCH_26_R)
        with Locations((4.999999999999999, 25.000000000000004)):
            Circle(SKETCH_26_R_2)
        with Locations((-5.000000000000001, -25.000000000000004)):
            Circle(SKETCH_26_R_3)
        with Locations((4.999999999999999, -25.000000000000004)):
            Circle(SKETCH_26_R_2)
    extrude(amount=-EXTRUDE_10_DEPTH)

    # 草图27 → 切除-拉伸10 (cut, through all)
    with BuildSketch(Plane.XZ.offset(27.570852423084734)):
        with Locations((2.2499999999999964, 21.000000000000004)):
            Rectangle(SKETCH_27_W, SKETCH_27_H)
    extrude(amount=-CUT_EXTRUDE_10_DEPTH, mode=Mode.SUBTRACT)

    # 草图29 → 切除-拉伸11 (cut)
    with BuildSketch(Plane(origin=(10.249999999999996, 0, 0), x_dir=(0, 0, -1), z_dir=(1, 0, 0))):
        with Locations((-17, 0)):
            Rectangle(SKETCH_29_W, SKETCH_29_H)
        Polygon((-33, 26.570852423084734), (-33, -26.570852423084734), (-1, -26.570852423084734), (-1.0000000000000009, 26.570852423084734), align=None, mode=Mode.SUBTRACT)
    extrude(amount=-CUT_EXTRUDE_11_DEPTH, mode=Mode.SUBTRACT)

    # 草图32 → 切除-拉伸13 (cut)
    with BuildSketch(Plane(origin=(10.249999999999996, 0, 0), x_dir=(0, 0, -1), z_dir=(1, 0, 0))):
        Polygon((-13, 26.570852423084734), (-25.000000000000004, 26.570852423084734), (-25.000000000000004, 20.000000000000004), (-28.97686279531797, 20.000000000000004), (-28.97686279531797, -19.999999999999996), (-25.000000000000004, -20), (-25.000000000000004, -26.570852423084734), (-12.999999999999993, -26.570852423084734), align=None)
        with Locations((-26.988431397658985, 23.28542621154237)):
            Rectangle(SKETCH_32_W, SKETCH_32_H)
        Polygon((-28.97686279531797, -19.999999999999996), (-28.97686279531797, -26.570852423084734), (-25.000000000000004, -26.570852423084734), (-25.000000000000004, -20), align=None)
        Polygon((-25.000000000000004, -26.570852423084734), (-28.97686279531797, -26.570852423084734), (-28.97686279531797, -27.59191586273335), (-12.999999999999995, -27.59191586273335), (-12.999999999999995, -26.57085242308473), align=None)
        Polygon((-28.97686279531797, 27.59388998719103), (-28.97686279531797, 26.570852423084734), (-25.000000000000004, 26.570852423084734), (-13, 26.570852423084734), (-12.999999999999995, 27.59388998719103), align=None)
    extrude(amount=-CUT_EXTRUDE_13_DEPTH, mode=Mode.SUBTRACT)

    # 草图33 → 切除-拉伸14 (cut)
    with BuildSketch(Plane(origin=(10.249999999999996, 0, 0), x_dir=(0, 0, -1), z_dir=(1, 0, 0))):
        with Locations((-31, 24.57085242308473)):
            Circle(SKETCH_33_R)
        with Locations((-31, -24.57085242308473)):
            Circle(SKETCH_33_R)
    extrude(amount=-CUT_EXTRUDE_14_DEPTH, mode=Mode.SUBTRACT)

    # 草图35 → 切除-拉伸15 (cut)
    with BuildSketch(Plane(origin=(10.249999999999996, 0, 0), x_dir=(0, 0, -1), z_dir=(1, 0, 0))):
        with Locations((-3.000000000000001, 24.57085242308473)):
            Circle(SKETCH_35_R)
        with Locations((-3, -24.57085242308473)):
            Circle(SKETCH_35_R)
    extrude(amount=-CUT_EXTRUDE_15_DEPTH, mode=Mode.SUBTRACT)

    # 草图36 → 切除-拉伸16 (cut)
    with BuildSketch(Plane.XZ.offset(37.57085242308474)):
        with Locations(Location((0, 4.999999999999998, 0), (0, 0, 270))):
            Circle(SKETCH_36_R)
    extrude(amount=-CUT_EXTRUDE_16_DEPTH, mode=Mode.SUBTRACT)

    # 草图37 → 切除-拉伸17 (cut)
    with BuildSketch(Plane(origin=(0, 37.57085242308474, 0), x_dir=(1, 0, 0), z_dir=(0, 1, 0)).offset(CUT_EXTRUDE_START)):
        with Locations(Location((0, -4.999999999999965, 0), (0, 0, 90))):
            Circle(SKETCH_37_R)
    extrude(amount=CUT_EXTRUDE_17_DEPTH, mode=Mode.SUBTRACT)

    # 草图38 → 切除-拉伸18 (cut, through all)
    with BuildSketch(Plane(origin=(0, 0, 29), x_dir=(-1, 0, 0), z_dir=(0, 0, -1))):
        Polygon((-67.73698273316278, 75.48551434956308), (54.96450412174318, 75.48551434956308), (54.9645041217432, -71.43548167539623), (-67.73698273316278, -71.43548167539623), align=None)
        with Locations((1.0000000000000036, 7.11e-15)):
            Rectangle(SKETCH_38_W, SKETCH_38_H, mode=Mode.SUBTRACT)
    extrude(amount=CUT_EXTRUDE_18_DEPTH, mode=Mode.SUBTRACT)

    # 草图39 → 切除-拉伸22 (cut)
    with BuildSketch(Plane(origin=(0, 0, 29), x_dir=(-1, 0, 0), z_dir=(0, 0, -1))):
        with Locations((6.983370748804627, 0.08769706306081382)):
            Circle(SKETCH_39_R)
        with Locations((0.08769706306078953, -6.983370748804625)):
            Circle(SKETCH_39_R)
        with Locations((-6.983370748804625, -0.08769706306076437)):
            Circle(SKETCH_39_R_2)
        with Locations((-4.999999999999999, 4.8759776240390575)):
            Circle(SKETCH_39_R)
        with Locations((-0.08769706306083723, 6.983370748804625)):
            Circle(SKETCH_39_R_3)
        with Locations((4.875977624039074, 4.999999999999982)):
            Circle(SKETCH_39_R_4)
        with Locations((4.999999999999967, -4.875977624039092)):
            Circle(SKETCH_39_R_5)
        with Locations((-4.875977624039108, -4.9999999999999485)):
            Circle(SKETCH_39_R_6)
    extrude(amount=-CUT_EXTRUDE_22_DEPTH, mode=Mode.SUBTRACT)

    # 草图41 → 切除-拉伸23 (cut)
    with BuildSketch(Plane(origin=(0, 0, 29), x_dir=(-1, 0, 0), z_dir=(0, 0, -1))):
        Rectangle(SKETCH_41_W, SKETCH_41_H)
    extrude(amount=-CUT_EXTRUDE_23_DEPTH, mode=Mode.SUBTRACT)


solid = part.part
